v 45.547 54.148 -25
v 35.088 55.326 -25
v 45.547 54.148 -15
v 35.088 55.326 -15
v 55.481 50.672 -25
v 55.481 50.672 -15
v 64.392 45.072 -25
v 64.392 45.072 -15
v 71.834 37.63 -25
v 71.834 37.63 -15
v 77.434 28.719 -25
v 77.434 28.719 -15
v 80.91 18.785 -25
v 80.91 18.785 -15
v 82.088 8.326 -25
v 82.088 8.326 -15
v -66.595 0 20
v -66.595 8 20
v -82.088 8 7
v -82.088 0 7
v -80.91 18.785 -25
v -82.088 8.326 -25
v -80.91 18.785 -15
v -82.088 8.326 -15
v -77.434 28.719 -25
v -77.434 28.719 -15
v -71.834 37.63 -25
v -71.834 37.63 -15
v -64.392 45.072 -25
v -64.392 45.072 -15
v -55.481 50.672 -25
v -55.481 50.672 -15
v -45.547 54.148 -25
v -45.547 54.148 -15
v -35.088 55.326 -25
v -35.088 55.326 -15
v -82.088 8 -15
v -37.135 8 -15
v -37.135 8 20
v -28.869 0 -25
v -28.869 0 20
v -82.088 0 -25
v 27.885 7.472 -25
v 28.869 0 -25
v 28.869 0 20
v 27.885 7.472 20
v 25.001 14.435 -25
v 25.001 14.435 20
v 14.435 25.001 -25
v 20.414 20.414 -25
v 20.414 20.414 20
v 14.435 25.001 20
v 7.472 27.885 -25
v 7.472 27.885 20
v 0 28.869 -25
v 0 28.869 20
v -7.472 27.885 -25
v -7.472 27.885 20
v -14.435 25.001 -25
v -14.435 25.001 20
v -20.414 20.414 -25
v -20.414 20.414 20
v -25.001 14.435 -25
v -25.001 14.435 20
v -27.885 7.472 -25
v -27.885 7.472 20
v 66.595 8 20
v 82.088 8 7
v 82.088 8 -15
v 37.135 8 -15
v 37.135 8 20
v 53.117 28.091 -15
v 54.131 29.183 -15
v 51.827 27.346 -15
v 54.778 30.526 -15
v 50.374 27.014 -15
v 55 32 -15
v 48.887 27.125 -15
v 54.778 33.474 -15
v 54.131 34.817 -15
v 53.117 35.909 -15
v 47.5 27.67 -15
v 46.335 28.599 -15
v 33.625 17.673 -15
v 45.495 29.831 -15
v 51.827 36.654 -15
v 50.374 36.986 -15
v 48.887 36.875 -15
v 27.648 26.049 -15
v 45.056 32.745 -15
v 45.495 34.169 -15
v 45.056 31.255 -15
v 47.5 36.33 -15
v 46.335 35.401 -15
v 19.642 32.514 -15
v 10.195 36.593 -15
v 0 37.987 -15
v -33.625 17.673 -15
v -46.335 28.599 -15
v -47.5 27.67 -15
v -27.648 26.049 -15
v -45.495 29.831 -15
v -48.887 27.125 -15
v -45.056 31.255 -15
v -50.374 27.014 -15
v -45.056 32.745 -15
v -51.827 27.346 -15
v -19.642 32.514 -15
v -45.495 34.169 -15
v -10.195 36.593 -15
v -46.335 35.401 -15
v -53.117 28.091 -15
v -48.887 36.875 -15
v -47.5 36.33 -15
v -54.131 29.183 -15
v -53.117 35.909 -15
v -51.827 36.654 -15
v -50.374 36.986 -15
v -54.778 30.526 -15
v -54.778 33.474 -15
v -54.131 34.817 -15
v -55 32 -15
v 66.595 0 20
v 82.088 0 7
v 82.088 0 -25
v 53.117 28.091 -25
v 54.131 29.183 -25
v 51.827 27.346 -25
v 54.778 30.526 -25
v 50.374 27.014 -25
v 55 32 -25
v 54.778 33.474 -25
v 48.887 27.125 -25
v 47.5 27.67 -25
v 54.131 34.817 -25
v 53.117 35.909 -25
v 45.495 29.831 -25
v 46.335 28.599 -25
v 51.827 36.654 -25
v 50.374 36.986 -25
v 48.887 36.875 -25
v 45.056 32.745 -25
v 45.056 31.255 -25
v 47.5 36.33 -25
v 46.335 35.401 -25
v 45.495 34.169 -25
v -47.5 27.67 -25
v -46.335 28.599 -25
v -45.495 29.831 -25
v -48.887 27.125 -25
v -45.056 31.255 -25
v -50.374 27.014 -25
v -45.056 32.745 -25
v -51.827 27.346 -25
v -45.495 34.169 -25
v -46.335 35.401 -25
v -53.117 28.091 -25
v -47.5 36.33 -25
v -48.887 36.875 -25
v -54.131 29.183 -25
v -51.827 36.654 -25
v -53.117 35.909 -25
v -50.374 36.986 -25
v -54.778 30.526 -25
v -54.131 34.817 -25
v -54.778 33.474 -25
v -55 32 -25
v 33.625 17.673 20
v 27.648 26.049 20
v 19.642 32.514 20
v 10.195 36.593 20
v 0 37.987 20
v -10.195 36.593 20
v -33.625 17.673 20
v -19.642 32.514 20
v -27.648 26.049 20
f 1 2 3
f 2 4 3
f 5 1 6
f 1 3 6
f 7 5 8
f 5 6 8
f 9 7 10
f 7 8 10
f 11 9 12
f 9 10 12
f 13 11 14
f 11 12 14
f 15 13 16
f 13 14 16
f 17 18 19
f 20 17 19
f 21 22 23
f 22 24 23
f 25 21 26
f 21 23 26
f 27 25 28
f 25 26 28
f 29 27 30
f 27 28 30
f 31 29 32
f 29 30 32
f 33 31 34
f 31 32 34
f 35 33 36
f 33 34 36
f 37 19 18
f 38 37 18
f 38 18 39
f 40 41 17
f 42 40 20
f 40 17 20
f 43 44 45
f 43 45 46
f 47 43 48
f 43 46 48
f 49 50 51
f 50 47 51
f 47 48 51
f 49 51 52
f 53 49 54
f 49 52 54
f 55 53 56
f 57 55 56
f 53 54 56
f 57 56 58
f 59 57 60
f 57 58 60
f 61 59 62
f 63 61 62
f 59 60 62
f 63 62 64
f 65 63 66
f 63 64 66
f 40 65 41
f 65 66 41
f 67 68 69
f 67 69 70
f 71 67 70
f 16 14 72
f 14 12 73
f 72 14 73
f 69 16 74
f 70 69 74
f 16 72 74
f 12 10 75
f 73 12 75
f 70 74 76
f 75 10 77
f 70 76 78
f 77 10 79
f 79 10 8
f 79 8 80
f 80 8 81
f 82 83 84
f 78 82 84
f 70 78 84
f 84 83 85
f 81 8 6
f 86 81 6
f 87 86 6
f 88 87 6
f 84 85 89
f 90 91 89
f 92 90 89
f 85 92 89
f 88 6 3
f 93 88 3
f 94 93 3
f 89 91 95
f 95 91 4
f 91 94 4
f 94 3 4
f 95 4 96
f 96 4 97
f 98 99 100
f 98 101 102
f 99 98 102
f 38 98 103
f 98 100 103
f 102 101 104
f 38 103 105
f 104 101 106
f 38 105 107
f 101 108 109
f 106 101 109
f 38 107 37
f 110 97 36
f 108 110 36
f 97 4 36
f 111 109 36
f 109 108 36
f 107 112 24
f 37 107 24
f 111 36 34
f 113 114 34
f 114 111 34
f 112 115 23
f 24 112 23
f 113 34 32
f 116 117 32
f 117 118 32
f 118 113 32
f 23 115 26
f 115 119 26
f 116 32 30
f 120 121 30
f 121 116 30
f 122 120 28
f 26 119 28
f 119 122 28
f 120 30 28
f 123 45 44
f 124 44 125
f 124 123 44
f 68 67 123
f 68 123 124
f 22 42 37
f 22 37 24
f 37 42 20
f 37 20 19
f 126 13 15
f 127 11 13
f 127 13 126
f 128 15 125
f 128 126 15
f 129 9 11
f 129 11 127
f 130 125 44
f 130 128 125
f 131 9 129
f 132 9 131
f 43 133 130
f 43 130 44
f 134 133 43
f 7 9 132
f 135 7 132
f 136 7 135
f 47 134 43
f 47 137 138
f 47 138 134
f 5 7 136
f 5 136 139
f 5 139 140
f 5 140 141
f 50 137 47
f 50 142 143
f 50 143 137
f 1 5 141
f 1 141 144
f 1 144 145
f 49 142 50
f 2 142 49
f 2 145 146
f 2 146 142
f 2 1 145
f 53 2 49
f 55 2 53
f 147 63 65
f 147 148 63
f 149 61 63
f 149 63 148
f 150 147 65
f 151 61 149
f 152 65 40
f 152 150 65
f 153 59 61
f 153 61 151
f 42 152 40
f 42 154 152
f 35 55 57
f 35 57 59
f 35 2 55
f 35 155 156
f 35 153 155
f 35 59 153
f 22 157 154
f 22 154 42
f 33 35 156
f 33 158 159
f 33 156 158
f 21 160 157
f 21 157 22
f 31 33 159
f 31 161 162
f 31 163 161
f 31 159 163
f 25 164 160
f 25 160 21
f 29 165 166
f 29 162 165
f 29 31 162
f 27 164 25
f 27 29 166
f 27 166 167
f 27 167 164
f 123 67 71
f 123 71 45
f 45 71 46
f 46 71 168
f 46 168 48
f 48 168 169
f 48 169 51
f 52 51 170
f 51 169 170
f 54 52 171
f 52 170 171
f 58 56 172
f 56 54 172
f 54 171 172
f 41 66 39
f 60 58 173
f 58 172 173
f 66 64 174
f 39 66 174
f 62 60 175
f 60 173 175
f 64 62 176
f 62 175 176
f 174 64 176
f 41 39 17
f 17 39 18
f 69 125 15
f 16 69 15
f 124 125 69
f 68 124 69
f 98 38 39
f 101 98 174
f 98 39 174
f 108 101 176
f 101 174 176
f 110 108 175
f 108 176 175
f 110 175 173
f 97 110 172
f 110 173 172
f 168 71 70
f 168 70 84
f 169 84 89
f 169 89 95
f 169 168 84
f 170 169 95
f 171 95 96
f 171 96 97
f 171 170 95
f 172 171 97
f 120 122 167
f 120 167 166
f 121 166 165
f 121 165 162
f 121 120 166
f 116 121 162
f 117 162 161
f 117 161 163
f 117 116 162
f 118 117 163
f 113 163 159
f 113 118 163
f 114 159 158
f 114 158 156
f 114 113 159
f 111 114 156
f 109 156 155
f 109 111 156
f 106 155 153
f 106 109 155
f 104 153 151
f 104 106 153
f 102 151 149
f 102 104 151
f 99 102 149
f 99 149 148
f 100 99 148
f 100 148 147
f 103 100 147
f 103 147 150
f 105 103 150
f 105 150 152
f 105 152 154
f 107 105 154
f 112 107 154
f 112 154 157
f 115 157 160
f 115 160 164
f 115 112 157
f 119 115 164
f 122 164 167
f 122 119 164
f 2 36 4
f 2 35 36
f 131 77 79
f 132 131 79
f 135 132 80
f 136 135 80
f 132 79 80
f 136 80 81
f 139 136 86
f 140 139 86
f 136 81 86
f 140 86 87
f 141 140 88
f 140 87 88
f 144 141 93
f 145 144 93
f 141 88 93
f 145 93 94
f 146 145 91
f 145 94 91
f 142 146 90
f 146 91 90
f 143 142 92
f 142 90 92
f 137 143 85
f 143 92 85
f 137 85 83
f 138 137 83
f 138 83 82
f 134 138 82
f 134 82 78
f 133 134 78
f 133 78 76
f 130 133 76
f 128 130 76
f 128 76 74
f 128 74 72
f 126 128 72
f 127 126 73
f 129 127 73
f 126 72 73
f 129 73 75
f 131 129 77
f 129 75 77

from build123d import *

# Parameters (mm, degrees)
ESTRUSIONE_ESTRUSIONE1_DEPTH = 20
ESTRUSIONE_ESTRUSIONE3_DEPTH = 5
RACCORDO1_R                  = 47
SCHIZZO5_R                   = 5
TAGLIO_ESTRUSIONE1_DEPTH     = 10
TAGLIO_ESTRUSIONE2_DEPTH     = 10
RACCORDO1_OF_SPECCHIA2_R     = 47


with BuildPart() as part:
    # Schizzo1 → Estrusione-Estrusione1 (new body, symmetric)
    with BuildSketch(Plane.XY):
        with BuildLine():
            Line((28.869072897, 0), (82.088181758, 0))
            Line((82.088181758, 0), (82.088181758, 8))
            Line((82.088181758, 8), (37.134650395, 8))
            ThreePointArc((37.134650395, 8), (23.865135757, 29.553976979), (0, 37.986606324))
            Line((0, 37.986606324), (0, 28.869072897))
            ThreePointArc((0, 28.869072897), (20.413517212, 20.413517212), (28.869072897, 0))
        make_face()
    estrusione_estrusione1 = extrude(amount=ESTRUSIONE_ESTRUSIONE1_DEPTH, both=True)

    # Schizzo4 → Estrusione-Estrusione3 (add, symmetric)
    with BuildSketch(Plane(origin=(0, 0, -20), x_dir=(-1, 0, 0), z_dir=(0, 0, -1))):
        with BuildLine():
            Line((-28.869072897, 0), (-82.088181758, 0))
            Line((-82.088181758, 0), (-82.088181758, 55.326384445))
            Line((-82.088181758, 55.326384445), (0, 55.326384445))
            Line((0, 55.326384445), (0, 28.869072897))
            ThreePointArc((0, 28.869072897), (-20.413517212, 20.413517212), (-28.869072897, 0))
        make_face()
    estrusione_estrusione3 = extrude(amount=ESTRUSIONE_ESTRUSIONE3_DEPTH, both=True)

    # Raccordo1
    raccordo1_edges = [part.edges().sort_by_distance(p)[0] for p in [
        (82.088181758, 55.326384445, -20),
    ]]
    fillet(raccordo1_edges, radius=RACCORDO1_R)

    # Schizzo5 → Taglio-Estrusione1 (cut)
    with BuildSketch(Plane.XY.offset(-15)):
        with Locations((50, 32)):
            Circle(SCHIZZO5_R)
    taglio_estrusione1 = extrude(amount=-TAGLIO_ESTRUSIONE1_DEPTH, mode=Mode.SUBTRACT)

    # Schizzo6 → Taglio-Estrusione2 (cut)
    with BuildSketch(Plane(origin=(0, 8, 0), x_dir=(1, 0, 0), z_dir=(0, 1, 0))):
        Polygon((66.595385054, -20), (82.088181758, -7), (82.088181758, -20), align=None)
    taglio_estrusione2 = extrude(amount=-TAGLIO_ESTRUSIONE2_DEPTH, mode=Mode.SUBTRACT)

    # Specchia2: Estrusione-Estrusione1, Estrusione-Estrusione3, Taglio-Estrusione1, Taglio-Estrusione2 across plane
    add(estrusione_estrusione1.mirror(Plane(origin=(0, 0, 0), x_dir=(0, 0, 1), z_dir=(1, 0, 0))))
    add(estrusione_estrusione3.mirror(Plane(origin=(0, 0, 0), x_dir=(0, 0, 1), z_dir=(1, 0, 0))))
    add(taglio_estrusione1.mirror(Plane(origin=(0, 0, 0), x_dir=(0, 0, 1), z_dir=(1, 0, 0))), mode=Mode.SUBTRACT)
    add(taglio_estrusione2.mirror(Plane(origin=(0, 0, 0), x_dir=(0, 0, 1), z_dir=(1, 0, 0))), mode=Mode.SUBTRACT)

    # Raccordo1 of Specchia2
    raccordo1_of_specchia2_edges = [part.edges().sort_by_distance(p)[0] for p in [
        (-82.088181758, 55.326384445, -20),
    ]]
    fillet(raccordo1_of_specchia2_edges, radius=RACCORDO1_OF_SPECCHIA2_R)


solid = part.part
